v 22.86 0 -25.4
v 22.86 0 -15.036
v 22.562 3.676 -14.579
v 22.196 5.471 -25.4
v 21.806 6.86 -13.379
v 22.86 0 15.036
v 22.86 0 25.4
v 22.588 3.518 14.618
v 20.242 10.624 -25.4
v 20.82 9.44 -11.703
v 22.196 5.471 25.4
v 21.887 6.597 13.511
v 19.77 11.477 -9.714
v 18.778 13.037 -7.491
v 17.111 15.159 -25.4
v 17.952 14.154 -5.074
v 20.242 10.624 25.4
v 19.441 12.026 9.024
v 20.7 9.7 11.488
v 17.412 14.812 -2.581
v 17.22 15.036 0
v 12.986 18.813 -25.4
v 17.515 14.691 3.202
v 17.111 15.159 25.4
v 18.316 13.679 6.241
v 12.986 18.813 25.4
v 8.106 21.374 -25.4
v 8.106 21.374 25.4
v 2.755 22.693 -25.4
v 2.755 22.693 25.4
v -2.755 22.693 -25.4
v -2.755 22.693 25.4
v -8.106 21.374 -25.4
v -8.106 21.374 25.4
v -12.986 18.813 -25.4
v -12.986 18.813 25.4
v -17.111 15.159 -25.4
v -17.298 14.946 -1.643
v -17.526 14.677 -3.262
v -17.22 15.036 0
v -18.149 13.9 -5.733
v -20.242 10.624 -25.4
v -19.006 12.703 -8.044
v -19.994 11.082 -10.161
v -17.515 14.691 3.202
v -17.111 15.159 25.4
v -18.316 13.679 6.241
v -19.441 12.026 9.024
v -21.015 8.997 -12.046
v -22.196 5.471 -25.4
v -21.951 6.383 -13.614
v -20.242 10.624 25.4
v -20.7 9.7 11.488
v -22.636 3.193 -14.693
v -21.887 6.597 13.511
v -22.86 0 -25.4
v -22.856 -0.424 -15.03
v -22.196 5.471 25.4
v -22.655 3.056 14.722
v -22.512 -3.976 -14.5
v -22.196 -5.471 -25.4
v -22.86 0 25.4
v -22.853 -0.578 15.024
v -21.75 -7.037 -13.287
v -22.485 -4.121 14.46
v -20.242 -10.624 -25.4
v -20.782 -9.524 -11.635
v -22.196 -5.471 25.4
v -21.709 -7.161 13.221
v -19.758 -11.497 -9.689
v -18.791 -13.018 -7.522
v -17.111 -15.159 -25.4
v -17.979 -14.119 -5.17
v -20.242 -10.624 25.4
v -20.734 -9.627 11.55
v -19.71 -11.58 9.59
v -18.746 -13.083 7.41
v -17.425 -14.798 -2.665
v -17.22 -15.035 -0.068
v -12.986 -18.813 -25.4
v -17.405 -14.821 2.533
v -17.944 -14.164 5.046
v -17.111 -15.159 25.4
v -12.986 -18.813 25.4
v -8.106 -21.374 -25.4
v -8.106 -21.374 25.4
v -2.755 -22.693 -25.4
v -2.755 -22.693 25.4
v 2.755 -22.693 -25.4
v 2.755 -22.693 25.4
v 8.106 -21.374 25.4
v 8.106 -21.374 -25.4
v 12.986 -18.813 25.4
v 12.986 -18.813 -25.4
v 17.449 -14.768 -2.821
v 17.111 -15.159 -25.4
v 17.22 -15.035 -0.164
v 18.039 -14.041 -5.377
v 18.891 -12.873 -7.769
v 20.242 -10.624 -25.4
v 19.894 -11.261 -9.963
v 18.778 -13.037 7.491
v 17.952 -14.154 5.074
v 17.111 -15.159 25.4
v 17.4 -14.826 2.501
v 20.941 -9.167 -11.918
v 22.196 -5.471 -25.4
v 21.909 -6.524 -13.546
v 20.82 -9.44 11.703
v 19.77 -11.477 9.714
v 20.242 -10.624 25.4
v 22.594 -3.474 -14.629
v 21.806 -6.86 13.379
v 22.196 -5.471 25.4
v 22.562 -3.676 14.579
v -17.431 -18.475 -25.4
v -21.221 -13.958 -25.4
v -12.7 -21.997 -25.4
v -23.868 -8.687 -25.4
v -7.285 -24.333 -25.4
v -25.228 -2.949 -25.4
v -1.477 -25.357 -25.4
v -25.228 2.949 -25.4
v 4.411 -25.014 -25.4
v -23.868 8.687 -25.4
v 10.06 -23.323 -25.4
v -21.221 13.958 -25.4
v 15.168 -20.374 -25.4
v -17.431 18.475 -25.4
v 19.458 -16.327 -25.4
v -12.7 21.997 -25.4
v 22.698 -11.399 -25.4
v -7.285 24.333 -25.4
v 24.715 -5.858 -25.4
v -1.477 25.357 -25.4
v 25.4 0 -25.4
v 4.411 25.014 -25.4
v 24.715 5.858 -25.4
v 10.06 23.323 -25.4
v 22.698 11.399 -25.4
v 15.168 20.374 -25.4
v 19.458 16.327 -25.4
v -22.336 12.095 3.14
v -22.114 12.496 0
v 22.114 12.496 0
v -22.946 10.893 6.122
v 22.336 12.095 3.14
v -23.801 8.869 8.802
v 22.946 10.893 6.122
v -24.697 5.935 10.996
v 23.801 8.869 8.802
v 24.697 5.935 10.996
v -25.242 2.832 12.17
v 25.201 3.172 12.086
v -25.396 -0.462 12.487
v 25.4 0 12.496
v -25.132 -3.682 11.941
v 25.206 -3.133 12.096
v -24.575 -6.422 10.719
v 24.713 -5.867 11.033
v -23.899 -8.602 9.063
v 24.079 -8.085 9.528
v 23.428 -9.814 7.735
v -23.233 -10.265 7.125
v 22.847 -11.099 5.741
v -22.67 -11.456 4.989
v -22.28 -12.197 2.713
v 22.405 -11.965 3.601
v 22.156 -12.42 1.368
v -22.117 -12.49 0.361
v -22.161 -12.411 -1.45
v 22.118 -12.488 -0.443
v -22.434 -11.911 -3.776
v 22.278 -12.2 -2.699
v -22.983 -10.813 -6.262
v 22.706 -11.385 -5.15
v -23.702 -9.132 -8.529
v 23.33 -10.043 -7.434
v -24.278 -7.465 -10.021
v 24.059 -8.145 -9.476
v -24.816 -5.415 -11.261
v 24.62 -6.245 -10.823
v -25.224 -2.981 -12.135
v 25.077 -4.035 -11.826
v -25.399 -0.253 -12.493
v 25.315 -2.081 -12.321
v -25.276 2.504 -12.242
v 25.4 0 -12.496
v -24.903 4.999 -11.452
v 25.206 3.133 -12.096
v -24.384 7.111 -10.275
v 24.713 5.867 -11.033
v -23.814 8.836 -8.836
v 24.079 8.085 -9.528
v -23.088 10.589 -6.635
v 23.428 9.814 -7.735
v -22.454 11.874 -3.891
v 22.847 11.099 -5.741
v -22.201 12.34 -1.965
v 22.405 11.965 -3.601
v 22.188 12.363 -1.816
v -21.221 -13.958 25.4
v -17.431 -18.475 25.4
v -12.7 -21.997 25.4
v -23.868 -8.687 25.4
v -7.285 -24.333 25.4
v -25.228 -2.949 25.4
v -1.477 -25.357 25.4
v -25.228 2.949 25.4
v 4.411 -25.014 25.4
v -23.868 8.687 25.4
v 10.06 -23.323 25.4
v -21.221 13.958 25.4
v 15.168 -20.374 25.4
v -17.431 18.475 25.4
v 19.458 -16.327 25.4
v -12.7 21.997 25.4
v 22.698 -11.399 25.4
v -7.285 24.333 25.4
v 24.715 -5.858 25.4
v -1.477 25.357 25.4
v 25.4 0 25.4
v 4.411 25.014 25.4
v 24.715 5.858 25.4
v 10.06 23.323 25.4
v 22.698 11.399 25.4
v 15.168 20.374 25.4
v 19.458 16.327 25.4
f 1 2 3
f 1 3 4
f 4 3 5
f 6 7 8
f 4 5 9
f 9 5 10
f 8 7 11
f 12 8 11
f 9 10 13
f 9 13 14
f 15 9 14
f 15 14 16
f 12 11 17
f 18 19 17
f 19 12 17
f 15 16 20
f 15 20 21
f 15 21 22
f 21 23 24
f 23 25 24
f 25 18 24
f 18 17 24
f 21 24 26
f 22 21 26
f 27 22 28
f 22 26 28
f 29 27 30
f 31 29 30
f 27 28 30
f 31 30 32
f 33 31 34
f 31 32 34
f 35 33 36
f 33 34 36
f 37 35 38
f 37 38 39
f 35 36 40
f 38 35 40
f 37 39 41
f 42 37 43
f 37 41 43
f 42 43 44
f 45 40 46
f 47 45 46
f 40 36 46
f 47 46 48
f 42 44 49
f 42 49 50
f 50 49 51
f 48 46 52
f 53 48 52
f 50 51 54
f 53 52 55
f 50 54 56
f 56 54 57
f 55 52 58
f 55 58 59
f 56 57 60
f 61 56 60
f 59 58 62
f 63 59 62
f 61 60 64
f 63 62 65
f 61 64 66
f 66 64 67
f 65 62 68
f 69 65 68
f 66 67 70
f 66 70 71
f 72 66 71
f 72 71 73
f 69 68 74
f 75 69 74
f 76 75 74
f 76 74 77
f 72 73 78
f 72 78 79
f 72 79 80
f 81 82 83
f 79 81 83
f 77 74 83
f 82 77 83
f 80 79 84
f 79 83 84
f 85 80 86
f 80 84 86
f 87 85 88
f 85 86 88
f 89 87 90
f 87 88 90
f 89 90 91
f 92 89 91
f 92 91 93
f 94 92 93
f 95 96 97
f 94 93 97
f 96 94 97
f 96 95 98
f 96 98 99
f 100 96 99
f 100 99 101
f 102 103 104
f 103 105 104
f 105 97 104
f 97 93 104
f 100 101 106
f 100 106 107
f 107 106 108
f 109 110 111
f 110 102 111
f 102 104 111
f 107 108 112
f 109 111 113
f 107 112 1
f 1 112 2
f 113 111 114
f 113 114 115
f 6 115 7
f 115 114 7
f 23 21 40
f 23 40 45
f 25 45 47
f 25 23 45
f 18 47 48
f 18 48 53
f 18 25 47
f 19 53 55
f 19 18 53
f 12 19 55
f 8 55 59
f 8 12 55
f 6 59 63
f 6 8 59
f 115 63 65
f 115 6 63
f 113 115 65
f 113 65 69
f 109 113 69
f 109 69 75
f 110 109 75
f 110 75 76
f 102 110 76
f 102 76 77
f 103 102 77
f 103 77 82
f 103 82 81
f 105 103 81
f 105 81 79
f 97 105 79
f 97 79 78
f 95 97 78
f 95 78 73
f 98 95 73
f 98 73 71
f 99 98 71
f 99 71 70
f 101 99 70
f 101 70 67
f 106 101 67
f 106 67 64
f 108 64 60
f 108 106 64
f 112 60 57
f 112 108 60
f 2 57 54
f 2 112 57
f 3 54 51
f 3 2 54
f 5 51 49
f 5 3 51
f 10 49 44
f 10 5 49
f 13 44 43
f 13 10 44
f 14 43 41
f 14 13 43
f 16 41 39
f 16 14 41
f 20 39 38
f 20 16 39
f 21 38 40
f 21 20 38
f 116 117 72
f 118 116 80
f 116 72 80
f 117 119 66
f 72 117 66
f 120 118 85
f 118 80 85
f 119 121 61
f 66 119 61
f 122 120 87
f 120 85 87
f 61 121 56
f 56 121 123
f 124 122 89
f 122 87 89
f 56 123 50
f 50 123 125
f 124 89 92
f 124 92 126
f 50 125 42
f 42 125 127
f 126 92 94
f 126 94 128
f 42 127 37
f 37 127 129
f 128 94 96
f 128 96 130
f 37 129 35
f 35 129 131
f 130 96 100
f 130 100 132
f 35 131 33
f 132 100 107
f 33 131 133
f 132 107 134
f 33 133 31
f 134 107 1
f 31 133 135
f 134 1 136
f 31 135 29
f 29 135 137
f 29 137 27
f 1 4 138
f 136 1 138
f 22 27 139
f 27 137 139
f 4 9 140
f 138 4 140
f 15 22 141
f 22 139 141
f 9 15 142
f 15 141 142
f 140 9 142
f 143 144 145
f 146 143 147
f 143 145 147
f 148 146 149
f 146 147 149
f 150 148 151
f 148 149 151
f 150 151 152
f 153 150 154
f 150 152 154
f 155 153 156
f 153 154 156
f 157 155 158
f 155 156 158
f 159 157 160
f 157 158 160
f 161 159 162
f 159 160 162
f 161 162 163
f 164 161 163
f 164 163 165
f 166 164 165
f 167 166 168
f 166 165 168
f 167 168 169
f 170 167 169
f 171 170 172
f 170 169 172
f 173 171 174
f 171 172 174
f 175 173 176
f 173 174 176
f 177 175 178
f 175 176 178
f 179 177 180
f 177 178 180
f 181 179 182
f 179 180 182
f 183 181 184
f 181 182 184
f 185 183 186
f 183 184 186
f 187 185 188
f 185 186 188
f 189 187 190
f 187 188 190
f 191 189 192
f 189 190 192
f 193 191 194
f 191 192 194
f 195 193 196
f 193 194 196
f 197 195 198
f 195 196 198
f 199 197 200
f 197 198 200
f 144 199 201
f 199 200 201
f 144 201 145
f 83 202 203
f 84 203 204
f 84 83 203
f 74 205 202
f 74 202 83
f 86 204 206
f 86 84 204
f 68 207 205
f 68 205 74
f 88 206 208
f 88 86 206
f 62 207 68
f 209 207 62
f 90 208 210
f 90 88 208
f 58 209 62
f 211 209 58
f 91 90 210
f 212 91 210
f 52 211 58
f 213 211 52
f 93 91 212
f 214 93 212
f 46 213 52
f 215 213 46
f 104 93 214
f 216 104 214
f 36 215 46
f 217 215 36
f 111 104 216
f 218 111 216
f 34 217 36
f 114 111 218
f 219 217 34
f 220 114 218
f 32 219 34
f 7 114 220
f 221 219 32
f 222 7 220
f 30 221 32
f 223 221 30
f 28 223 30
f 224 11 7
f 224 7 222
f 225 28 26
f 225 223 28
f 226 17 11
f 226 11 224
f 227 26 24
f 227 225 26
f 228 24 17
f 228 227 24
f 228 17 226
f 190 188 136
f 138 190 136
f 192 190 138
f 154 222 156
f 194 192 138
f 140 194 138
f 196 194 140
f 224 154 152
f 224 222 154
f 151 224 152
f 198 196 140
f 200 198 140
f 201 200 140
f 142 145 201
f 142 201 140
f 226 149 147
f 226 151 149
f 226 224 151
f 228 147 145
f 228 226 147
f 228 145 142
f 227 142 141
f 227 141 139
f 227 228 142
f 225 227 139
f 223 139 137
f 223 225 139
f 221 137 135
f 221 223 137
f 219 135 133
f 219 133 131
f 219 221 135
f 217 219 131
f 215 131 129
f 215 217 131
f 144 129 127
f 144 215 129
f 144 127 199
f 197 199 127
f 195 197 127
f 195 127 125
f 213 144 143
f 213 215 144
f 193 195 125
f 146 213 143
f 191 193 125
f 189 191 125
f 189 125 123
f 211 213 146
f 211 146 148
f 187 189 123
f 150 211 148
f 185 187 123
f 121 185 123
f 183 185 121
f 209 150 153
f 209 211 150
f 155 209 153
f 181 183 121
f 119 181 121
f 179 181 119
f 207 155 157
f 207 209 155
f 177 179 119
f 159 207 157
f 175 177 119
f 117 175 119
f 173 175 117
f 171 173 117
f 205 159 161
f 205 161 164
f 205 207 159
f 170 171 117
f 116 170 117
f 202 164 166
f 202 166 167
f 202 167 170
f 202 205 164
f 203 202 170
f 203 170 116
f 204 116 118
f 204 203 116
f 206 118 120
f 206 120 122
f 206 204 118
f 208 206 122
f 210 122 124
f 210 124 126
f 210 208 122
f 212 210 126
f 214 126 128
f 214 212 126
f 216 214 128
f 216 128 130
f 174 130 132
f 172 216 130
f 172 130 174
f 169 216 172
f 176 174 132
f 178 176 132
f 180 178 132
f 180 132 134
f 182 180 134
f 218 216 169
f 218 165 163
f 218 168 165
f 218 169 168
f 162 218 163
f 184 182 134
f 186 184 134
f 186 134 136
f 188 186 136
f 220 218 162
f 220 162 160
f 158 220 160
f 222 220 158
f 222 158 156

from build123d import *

# Parameters (mm, degrees)
F0_R     = 25.4
F1_DEPTH = 25.4
F2_R     = 12.495543
F3_DEPTH = 43.18
F4_T     = -2.54


with BuildPart() as f1:
    # F0 (on Top) → F1 (new body, symmetric)
    with BuildSketch(Plane.XY):
        Circle(F0_R)
    extrude(amount=F1_DEPTH, both=True)

    # F2 (on Right) → F3 (cut, symmetric)
    with BuildSketch(Plane.YZ):
        Circle(F2_R)
    extrude(amount=F3_DEPTH, both=True, mode=Mode.SUBTRACT)

    # F4
    f4_openings = [f1.faces().sort_by_distance(p)[0] for p in [
        (0, 0, 25.4),
        (0, 0, -25.4),
    ]]
    offset(amount=F4_T, openings=f4_openings)


solid = f1.part
